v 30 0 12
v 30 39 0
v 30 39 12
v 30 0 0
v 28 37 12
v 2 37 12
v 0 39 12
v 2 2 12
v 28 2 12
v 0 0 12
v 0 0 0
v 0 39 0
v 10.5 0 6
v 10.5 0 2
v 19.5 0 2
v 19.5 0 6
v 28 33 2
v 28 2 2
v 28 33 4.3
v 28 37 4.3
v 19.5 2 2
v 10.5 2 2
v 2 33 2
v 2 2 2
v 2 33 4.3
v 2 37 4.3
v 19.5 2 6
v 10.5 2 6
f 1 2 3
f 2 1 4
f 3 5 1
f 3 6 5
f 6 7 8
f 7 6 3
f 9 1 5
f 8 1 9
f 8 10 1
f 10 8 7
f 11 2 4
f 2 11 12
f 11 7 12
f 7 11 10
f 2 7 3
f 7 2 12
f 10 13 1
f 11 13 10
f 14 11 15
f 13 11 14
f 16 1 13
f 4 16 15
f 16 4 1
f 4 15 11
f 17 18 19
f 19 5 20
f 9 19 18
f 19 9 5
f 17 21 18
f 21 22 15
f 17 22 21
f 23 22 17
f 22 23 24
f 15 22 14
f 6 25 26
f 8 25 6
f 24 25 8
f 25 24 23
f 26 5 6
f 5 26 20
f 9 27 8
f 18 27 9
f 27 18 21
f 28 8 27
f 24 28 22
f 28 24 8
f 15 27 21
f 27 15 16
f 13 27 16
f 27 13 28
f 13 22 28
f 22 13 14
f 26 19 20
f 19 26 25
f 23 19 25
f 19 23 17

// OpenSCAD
wall_thickness=2;
wemos_x=26;
wemos_y=35;
wemos_z=10;

module wemos_case()
{
   usb_y=9;
   usb_z=4;
   difference(){
      wt2=wall_thickness*2;
      cube([wemos_x+wt2,wemos_y+wt2,wemos_z+wall_thickness]);
      // kill the inside of the enclosure
      translate([wall_thickness,wall_thickness,wall_thickness])
         cube([wemos_x,wemos_y,wemos_z+1]);
      // cut out the micro-usb opening
      translate([wall_thickness+wemos_x/2-usb_y/2,-1,wall_thickness])
         cube([usb_y,wall_thickness+2,usb_z]);
   }
   // Add a support under the antenna
   translate([wall_thickness,wall_thickness+wemos_y-4,wall_thickness])
      cube([wemos_x,4,2.3]);
}

wemos_case();
